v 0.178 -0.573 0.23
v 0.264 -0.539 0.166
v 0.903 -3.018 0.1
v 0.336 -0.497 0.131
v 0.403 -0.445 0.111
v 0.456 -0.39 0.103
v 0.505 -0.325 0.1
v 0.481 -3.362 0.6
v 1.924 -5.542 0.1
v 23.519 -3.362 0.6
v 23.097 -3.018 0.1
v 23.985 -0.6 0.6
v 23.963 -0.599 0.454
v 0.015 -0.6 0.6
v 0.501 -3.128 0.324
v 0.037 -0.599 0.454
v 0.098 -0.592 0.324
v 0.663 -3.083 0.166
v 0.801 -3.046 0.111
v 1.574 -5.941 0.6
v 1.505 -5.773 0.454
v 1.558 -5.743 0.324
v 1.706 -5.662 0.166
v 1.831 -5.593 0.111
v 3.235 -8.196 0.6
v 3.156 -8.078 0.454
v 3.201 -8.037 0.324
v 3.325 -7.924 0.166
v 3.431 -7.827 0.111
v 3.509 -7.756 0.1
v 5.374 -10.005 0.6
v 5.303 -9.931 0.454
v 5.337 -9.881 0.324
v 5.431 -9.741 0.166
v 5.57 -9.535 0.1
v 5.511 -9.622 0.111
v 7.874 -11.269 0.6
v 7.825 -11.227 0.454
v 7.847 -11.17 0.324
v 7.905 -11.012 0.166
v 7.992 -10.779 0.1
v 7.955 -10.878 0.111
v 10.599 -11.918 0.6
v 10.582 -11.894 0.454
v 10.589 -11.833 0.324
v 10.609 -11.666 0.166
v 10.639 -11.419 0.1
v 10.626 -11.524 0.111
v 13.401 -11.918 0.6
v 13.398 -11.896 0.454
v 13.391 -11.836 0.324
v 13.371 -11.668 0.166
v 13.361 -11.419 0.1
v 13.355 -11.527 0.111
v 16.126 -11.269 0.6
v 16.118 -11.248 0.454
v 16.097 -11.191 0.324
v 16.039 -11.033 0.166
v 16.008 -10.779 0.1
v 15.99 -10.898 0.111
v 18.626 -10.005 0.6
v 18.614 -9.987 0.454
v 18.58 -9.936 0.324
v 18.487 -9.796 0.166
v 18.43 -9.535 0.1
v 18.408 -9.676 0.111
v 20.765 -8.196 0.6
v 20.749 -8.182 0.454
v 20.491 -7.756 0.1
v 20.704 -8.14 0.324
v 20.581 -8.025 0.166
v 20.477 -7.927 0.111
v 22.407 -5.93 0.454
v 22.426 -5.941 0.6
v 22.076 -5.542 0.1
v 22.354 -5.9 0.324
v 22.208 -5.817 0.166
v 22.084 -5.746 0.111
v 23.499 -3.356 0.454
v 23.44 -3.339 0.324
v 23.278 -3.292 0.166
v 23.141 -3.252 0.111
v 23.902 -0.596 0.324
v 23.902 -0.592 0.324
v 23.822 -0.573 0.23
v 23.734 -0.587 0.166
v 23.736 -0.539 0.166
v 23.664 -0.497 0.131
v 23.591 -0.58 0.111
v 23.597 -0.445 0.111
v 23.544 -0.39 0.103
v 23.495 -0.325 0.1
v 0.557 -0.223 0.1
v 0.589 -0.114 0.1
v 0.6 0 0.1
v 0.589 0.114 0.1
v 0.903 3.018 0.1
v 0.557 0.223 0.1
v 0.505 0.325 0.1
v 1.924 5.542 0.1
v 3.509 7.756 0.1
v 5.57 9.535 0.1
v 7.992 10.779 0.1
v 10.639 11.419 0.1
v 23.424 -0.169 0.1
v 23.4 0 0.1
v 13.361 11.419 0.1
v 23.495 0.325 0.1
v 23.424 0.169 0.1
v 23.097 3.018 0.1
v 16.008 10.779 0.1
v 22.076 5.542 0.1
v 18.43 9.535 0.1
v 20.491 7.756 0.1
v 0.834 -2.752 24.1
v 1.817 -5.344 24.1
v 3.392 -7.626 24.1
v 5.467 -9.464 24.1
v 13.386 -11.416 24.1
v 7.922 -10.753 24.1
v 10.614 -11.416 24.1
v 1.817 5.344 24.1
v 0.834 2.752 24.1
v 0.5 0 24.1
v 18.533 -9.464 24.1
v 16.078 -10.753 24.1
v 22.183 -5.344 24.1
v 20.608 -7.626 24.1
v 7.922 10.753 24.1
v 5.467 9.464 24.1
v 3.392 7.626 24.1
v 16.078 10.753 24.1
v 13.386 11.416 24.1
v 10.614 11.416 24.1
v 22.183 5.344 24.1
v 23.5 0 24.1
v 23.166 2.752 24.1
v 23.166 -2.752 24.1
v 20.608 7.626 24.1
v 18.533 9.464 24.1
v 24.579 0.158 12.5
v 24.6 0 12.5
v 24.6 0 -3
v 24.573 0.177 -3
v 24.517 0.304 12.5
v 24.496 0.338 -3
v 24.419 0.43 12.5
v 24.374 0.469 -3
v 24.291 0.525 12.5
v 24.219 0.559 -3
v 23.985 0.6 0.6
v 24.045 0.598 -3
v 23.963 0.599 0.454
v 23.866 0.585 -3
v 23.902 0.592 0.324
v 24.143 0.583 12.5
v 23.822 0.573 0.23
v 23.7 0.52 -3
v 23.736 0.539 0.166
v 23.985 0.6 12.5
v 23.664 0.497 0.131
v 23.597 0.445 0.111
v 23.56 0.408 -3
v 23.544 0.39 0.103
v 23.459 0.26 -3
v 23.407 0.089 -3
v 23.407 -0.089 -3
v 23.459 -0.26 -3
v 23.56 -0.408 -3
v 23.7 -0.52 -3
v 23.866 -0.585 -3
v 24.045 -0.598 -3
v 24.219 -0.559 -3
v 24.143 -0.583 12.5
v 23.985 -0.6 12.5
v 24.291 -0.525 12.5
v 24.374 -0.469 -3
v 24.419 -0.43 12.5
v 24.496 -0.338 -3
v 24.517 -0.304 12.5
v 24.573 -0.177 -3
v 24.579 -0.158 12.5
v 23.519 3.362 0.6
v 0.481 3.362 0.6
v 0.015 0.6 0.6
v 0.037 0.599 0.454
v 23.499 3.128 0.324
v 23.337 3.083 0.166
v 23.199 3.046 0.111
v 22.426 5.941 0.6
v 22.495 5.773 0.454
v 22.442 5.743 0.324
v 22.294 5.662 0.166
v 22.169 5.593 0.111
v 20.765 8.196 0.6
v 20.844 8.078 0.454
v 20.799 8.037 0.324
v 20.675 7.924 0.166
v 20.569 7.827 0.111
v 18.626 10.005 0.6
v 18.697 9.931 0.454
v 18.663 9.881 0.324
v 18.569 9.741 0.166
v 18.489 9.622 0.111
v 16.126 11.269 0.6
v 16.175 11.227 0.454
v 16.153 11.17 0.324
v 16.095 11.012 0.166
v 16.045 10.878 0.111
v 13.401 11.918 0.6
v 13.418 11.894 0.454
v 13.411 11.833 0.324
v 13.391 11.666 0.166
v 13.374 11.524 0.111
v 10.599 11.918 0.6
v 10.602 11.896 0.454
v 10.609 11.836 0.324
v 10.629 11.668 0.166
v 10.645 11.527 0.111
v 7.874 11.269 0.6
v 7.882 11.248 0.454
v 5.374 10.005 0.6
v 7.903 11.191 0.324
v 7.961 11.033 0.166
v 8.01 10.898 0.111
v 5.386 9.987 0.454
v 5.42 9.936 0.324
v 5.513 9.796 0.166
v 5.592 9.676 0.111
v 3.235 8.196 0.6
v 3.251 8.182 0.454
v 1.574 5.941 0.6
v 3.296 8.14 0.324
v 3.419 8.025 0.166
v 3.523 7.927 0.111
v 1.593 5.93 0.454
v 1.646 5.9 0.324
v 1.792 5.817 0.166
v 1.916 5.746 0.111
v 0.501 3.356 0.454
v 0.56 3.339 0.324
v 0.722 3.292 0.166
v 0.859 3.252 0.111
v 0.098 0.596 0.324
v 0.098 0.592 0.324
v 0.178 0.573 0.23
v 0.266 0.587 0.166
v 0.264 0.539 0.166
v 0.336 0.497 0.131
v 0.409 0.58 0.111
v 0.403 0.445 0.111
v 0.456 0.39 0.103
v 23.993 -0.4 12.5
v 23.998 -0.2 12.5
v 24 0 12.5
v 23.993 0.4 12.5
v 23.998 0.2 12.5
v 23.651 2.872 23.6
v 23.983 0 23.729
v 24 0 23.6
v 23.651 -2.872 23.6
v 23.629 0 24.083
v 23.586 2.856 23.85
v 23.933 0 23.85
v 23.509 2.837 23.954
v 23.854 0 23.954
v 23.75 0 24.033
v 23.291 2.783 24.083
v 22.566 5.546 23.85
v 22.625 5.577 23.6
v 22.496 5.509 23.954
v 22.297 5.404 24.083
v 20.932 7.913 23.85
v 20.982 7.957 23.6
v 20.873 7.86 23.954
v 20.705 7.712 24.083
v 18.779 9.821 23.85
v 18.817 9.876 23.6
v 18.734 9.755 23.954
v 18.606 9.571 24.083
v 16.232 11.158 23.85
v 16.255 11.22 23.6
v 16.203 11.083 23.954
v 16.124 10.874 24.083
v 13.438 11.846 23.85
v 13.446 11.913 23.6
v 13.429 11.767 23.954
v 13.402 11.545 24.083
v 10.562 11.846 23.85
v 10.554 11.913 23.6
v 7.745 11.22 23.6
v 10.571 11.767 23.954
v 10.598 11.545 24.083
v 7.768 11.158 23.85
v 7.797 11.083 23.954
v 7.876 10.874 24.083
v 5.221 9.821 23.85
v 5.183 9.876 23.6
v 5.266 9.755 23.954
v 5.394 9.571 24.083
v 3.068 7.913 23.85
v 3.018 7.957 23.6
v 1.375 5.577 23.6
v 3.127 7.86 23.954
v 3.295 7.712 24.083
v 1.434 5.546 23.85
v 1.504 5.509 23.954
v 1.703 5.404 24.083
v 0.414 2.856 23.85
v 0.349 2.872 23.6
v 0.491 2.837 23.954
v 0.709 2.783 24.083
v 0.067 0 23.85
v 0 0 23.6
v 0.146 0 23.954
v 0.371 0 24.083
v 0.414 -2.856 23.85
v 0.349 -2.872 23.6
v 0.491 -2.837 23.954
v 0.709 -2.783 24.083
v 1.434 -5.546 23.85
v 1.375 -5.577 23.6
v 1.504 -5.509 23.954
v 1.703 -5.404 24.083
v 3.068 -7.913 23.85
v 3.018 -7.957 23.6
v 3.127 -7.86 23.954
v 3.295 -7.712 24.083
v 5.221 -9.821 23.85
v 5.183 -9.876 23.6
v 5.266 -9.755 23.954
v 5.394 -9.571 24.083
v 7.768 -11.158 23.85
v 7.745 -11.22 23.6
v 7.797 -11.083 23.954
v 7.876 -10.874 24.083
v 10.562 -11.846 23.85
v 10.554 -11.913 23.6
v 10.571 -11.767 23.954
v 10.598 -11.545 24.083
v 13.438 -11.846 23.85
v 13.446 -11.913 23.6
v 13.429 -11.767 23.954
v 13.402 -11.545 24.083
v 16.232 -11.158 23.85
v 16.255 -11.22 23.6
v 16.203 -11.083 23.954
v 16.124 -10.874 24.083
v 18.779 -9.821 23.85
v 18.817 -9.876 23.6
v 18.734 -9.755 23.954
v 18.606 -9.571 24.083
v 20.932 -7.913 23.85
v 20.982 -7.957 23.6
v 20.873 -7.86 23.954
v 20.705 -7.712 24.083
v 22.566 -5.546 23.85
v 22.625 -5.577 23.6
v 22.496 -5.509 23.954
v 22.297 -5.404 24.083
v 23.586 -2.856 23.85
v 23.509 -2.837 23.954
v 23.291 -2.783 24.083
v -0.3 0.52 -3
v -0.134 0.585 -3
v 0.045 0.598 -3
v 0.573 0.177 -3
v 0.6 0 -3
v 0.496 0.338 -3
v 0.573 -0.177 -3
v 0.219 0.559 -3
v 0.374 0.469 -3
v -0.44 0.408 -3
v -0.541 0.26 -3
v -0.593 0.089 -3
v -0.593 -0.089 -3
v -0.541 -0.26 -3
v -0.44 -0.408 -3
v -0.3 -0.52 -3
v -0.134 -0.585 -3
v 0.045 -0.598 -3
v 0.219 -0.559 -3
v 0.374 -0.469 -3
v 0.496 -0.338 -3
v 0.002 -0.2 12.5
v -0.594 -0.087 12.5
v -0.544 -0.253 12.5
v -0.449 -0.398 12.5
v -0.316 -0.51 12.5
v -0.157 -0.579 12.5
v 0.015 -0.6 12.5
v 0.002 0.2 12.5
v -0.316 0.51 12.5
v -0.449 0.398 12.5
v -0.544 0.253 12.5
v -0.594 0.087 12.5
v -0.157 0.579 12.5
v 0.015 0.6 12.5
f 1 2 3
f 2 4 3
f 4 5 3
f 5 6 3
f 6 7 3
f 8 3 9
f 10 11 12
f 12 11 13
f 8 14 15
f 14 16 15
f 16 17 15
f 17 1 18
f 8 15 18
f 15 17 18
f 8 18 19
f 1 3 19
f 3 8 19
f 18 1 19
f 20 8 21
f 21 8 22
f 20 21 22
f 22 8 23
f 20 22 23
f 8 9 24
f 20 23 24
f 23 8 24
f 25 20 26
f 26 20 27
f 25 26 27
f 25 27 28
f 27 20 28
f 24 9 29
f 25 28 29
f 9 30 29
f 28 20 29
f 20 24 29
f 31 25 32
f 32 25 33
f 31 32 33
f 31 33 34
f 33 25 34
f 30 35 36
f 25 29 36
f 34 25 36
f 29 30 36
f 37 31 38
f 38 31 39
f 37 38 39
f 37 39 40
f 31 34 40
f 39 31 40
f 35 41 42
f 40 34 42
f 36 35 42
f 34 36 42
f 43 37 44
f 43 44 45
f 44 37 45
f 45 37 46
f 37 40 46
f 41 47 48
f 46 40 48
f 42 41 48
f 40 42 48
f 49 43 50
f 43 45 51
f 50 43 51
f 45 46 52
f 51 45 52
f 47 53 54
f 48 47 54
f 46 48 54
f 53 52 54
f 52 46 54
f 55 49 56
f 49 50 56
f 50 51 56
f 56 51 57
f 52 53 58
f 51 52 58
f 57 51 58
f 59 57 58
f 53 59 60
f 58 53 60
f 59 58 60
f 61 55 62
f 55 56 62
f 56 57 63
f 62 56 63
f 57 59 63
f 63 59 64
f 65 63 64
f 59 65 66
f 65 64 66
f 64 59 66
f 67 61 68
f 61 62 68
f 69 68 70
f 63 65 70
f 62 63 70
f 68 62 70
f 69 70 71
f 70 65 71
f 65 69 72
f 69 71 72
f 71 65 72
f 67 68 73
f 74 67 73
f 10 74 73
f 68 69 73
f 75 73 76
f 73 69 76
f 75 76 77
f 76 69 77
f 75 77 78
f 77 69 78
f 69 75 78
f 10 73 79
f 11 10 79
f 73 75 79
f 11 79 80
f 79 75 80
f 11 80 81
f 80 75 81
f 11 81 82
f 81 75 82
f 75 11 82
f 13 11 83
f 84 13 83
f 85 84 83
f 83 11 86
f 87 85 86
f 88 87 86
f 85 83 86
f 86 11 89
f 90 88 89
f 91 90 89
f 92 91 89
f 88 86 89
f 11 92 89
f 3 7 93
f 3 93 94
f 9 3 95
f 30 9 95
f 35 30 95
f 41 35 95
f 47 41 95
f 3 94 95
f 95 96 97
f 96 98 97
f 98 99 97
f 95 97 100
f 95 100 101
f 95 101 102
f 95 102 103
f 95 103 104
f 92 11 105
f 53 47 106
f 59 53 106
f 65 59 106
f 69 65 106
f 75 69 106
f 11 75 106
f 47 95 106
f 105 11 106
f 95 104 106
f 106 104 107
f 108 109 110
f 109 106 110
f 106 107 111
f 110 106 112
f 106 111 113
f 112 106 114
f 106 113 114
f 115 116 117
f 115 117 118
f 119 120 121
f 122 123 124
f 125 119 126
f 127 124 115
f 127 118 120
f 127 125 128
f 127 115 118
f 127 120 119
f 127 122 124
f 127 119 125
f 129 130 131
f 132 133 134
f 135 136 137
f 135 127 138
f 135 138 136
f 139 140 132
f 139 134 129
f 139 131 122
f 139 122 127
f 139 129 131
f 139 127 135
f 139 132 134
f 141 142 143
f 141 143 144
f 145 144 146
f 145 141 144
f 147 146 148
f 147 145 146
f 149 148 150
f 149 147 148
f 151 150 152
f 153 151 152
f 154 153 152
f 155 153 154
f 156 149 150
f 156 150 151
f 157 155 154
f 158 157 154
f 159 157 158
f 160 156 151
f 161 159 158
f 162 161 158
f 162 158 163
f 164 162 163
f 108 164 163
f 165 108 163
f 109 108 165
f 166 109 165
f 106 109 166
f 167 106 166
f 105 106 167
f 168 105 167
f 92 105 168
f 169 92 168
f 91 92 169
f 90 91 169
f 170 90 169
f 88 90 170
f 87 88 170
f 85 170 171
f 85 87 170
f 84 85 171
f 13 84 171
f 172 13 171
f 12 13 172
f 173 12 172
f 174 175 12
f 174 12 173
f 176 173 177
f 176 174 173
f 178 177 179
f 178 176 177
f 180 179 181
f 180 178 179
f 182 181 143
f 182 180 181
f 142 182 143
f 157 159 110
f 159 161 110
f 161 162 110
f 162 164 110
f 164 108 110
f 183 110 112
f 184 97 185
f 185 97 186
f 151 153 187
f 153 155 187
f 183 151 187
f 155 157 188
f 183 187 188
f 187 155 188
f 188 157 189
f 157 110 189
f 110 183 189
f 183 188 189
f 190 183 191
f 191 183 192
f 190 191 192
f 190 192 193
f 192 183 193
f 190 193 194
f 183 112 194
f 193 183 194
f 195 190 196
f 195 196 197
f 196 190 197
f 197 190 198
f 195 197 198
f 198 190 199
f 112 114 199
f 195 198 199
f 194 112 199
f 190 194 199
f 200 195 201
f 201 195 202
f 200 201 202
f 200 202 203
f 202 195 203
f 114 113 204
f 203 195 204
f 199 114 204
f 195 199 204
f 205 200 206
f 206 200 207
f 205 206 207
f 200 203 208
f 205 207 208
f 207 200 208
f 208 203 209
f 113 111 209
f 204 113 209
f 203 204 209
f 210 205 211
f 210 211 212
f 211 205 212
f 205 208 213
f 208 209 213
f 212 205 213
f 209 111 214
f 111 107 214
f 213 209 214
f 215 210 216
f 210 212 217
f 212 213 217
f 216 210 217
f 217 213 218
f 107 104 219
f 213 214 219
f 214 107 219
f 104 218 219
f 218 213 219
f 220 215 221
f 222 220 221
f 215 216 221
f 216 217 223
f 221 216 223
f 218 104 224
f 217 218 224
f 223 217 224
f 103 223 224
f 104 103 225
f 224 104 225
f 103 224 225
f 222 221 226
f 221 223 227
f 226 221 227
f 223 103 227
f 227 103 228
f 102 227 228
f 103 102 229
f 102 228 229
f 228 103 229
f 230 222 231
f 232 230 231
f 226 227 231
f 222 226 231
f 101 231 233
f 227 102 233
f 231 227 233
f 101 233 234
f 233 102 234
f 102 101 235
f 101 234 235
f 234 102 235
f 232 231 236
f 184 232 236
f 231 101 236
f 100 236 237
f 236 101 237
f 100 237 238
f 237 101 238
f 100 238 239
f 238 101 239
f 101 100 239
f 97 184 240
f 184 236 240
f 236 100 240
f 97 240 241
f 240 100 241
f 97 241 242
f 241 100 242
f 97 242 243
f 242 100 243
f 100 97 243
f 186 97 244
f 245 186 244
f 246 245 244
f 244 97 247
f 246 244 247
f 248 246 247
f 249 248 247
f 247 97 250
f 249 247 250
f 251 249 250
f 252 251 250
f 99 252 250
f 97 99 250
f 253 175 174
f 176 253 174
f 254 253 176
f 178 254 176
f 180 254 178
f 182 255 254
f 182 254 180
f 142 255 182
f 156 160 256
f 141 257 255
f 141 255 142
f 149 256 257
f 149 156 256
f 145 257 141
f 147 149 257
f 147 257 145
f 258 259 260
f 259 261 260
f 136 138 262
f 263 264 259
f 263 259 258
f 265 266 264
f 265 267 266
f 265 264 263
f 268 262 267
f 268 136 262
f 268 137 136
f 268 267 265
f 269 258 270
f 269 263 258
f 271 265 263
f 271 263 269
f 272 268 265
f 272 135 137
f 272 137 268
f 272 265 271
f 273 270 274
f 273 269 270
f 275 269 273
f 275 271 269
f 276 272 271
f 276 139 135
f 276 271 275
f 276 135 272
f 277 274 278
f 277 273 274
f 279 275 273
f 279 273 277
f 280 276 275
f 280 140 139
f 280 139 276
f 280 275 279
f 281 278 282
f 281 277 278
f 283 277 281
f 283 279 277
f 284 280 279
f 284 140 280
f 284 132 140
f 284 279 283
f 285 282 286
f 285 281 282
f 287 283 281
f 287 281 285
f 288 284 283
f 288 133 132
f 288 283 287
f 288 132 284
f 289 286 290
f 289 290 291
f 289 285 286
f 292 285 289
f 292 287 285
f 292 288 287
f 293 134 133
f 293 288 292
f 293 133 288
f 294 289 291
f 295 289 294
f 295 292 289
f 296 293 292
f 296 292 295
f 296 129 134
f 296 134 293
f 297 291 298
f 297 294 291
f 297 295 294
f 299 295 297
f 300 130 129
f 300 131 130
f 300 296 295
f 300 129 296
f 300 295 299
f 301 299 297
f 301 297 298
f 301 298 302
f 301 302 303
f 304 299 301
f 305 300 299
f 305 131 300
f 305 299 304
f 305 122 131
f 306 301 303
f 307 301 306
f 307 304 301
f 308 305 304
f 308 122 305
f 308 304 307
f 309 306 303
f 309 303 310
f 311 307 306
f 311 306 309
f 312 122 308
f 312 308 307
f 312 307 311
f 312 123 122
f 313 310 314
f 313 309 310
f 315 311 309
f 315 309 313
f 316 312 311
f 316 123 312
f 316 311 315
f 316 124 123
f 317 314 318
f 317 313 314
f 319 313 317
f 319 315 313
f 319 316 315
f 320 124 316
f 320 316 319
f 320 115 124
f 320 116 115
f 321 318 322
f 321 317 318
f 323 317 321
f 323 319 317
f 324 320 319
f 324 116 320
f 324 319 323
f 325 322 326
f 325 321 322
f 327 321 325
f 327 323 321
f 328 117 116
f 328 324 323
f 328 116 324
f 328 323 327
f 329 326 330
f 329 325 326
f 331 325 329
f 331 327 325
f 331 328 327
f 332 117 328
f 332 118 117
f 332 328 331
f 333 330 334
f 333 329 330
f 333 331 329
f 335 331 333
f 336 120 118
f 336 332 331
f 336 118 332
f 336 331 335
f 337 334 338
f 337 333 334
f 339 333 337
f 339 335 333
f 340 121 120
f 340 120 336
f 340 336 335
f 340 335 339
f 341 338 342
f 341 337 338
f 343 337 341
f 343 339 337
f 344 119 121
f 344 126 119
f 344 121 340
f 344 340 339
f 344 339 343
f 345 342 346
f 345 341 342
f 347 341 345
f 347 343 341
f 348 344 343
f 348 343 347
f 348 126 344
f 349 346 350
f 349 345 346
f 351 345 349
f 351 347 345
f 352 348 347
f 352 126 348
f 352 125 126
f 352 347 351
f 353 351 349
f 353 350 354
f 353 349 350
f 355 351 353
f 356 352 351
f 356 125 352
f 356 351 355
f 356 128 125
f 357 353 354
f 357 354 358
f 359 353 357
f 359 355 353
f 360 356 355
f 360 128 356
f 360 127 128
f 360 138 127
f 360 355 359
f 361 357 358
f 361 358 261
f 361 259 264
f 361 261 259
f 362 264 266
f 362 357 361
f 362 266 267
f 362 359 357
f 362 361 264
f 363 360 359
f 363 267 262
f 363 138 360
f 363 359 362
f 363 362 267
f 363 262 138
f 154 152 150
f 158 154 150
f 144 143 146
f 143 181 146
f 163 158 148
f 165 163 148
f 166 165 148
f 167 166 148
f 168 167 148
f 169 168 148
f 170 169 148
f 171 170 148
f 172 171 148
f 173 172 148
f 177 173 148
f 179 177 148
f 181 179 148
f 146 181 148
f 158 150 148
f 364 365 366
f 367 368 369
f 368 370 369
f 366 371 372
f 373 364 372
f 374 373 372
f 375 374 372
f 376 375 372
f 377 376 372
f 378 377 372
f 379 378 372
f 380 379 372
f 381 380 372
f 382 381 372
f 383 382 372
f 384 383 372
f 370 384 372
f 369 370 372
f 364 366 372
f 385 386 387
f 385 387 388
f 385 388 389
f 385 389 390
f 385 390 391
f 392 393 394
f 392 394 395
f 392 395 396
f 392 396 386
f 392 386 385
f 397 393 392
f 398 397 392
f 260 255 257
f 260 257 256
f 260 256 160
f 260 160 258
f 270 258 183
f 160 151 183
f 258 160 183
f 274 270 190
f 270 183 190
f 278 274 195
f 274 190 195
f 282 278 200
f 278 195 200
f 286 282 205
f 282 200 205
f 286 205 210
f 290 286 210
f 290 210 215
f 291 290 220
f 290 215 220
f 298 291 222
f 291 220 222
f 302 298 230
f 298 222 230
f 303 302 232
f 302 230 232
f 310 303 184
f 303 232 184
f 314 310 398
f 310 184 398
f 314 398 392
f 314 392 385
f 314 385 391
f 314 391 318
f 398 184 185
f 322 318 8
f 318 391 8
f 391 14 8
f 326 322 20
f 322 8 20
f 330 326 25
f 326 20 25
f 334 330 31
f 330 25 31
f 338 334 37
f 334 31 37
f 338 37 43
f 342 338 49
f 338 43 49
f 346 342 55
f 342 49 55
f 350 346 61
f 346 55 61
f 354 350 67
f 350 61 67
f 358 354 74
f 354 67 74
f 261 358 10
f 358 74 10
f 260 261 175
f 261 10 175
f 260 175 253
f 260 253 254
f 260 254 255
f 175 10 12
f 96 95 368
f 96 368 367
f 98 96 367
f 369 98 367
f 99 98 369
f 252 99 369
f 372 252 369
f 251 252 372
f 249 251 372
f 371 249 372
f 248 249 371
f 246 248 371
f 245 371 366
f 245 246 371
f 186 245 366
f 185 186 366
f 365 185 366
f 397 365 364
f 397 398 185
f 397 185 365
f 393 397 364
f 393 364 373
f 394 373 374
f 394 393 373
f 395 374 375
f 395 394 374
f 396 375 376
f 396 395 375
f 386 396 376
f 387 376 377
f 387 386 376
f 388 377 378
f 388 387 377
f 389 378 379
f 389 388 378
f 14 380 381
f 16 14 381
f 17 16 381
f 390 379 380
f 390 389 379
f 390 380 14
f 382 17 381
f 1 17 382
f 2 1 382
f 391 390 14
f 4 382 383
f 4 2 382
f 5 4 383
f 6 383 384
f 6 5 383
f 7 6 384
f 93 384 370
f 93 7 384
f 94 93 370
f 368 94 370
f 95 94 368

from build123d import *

# Parameters (mm, degrees)
SKETCH001_R       = 0.6
PAD001_DEPTH      = 12
PAD001_DEPTH_BACK = 3.5
SKETCH_R          = 12
PAD_DEPTH         = 24
FILLET_R          = 0.5


with BuildPart() as pad001:
    # Sketch001 → Pad001 (new body, two sides)
    with BuildSketch(Plane.XY.offset(0.5)) as pad001_sk:
        Circle(SKETCH001_R)
        with Locations((24, 0)):
            Circle(SKETCH001_R)
    extrude(amount=PAD001_DEPTH)
    extrude(pad001_sk.sketch, amount=-PAD001_DEPTH_BACK)


with BuildPart() as l_radial_d24_0mm_p24_00mm:
    # Sketch → Pad (new body)
    with BuildSketch(Plane.XY.offset(0.1)):
        with Locations((12, 0)):
            Circle(SKETCH_R)
    extrude(amount=PAD_DEPTH)

    # Fillet
    fillet_edges = [l_radial_d24_0mm_p24_00mm.edges().sort_by_distance(p)[0] for p in [
        (0, 0, 0.1),
        (0, 0, 24.1),
    ]]
    fillet(fillet_edges, radius=FILLET_R)

    # Fillet_mp_cp: union Pad001
    add(pad001.part)


solid = l_radial_d24_0mm_p24_00mm.part
